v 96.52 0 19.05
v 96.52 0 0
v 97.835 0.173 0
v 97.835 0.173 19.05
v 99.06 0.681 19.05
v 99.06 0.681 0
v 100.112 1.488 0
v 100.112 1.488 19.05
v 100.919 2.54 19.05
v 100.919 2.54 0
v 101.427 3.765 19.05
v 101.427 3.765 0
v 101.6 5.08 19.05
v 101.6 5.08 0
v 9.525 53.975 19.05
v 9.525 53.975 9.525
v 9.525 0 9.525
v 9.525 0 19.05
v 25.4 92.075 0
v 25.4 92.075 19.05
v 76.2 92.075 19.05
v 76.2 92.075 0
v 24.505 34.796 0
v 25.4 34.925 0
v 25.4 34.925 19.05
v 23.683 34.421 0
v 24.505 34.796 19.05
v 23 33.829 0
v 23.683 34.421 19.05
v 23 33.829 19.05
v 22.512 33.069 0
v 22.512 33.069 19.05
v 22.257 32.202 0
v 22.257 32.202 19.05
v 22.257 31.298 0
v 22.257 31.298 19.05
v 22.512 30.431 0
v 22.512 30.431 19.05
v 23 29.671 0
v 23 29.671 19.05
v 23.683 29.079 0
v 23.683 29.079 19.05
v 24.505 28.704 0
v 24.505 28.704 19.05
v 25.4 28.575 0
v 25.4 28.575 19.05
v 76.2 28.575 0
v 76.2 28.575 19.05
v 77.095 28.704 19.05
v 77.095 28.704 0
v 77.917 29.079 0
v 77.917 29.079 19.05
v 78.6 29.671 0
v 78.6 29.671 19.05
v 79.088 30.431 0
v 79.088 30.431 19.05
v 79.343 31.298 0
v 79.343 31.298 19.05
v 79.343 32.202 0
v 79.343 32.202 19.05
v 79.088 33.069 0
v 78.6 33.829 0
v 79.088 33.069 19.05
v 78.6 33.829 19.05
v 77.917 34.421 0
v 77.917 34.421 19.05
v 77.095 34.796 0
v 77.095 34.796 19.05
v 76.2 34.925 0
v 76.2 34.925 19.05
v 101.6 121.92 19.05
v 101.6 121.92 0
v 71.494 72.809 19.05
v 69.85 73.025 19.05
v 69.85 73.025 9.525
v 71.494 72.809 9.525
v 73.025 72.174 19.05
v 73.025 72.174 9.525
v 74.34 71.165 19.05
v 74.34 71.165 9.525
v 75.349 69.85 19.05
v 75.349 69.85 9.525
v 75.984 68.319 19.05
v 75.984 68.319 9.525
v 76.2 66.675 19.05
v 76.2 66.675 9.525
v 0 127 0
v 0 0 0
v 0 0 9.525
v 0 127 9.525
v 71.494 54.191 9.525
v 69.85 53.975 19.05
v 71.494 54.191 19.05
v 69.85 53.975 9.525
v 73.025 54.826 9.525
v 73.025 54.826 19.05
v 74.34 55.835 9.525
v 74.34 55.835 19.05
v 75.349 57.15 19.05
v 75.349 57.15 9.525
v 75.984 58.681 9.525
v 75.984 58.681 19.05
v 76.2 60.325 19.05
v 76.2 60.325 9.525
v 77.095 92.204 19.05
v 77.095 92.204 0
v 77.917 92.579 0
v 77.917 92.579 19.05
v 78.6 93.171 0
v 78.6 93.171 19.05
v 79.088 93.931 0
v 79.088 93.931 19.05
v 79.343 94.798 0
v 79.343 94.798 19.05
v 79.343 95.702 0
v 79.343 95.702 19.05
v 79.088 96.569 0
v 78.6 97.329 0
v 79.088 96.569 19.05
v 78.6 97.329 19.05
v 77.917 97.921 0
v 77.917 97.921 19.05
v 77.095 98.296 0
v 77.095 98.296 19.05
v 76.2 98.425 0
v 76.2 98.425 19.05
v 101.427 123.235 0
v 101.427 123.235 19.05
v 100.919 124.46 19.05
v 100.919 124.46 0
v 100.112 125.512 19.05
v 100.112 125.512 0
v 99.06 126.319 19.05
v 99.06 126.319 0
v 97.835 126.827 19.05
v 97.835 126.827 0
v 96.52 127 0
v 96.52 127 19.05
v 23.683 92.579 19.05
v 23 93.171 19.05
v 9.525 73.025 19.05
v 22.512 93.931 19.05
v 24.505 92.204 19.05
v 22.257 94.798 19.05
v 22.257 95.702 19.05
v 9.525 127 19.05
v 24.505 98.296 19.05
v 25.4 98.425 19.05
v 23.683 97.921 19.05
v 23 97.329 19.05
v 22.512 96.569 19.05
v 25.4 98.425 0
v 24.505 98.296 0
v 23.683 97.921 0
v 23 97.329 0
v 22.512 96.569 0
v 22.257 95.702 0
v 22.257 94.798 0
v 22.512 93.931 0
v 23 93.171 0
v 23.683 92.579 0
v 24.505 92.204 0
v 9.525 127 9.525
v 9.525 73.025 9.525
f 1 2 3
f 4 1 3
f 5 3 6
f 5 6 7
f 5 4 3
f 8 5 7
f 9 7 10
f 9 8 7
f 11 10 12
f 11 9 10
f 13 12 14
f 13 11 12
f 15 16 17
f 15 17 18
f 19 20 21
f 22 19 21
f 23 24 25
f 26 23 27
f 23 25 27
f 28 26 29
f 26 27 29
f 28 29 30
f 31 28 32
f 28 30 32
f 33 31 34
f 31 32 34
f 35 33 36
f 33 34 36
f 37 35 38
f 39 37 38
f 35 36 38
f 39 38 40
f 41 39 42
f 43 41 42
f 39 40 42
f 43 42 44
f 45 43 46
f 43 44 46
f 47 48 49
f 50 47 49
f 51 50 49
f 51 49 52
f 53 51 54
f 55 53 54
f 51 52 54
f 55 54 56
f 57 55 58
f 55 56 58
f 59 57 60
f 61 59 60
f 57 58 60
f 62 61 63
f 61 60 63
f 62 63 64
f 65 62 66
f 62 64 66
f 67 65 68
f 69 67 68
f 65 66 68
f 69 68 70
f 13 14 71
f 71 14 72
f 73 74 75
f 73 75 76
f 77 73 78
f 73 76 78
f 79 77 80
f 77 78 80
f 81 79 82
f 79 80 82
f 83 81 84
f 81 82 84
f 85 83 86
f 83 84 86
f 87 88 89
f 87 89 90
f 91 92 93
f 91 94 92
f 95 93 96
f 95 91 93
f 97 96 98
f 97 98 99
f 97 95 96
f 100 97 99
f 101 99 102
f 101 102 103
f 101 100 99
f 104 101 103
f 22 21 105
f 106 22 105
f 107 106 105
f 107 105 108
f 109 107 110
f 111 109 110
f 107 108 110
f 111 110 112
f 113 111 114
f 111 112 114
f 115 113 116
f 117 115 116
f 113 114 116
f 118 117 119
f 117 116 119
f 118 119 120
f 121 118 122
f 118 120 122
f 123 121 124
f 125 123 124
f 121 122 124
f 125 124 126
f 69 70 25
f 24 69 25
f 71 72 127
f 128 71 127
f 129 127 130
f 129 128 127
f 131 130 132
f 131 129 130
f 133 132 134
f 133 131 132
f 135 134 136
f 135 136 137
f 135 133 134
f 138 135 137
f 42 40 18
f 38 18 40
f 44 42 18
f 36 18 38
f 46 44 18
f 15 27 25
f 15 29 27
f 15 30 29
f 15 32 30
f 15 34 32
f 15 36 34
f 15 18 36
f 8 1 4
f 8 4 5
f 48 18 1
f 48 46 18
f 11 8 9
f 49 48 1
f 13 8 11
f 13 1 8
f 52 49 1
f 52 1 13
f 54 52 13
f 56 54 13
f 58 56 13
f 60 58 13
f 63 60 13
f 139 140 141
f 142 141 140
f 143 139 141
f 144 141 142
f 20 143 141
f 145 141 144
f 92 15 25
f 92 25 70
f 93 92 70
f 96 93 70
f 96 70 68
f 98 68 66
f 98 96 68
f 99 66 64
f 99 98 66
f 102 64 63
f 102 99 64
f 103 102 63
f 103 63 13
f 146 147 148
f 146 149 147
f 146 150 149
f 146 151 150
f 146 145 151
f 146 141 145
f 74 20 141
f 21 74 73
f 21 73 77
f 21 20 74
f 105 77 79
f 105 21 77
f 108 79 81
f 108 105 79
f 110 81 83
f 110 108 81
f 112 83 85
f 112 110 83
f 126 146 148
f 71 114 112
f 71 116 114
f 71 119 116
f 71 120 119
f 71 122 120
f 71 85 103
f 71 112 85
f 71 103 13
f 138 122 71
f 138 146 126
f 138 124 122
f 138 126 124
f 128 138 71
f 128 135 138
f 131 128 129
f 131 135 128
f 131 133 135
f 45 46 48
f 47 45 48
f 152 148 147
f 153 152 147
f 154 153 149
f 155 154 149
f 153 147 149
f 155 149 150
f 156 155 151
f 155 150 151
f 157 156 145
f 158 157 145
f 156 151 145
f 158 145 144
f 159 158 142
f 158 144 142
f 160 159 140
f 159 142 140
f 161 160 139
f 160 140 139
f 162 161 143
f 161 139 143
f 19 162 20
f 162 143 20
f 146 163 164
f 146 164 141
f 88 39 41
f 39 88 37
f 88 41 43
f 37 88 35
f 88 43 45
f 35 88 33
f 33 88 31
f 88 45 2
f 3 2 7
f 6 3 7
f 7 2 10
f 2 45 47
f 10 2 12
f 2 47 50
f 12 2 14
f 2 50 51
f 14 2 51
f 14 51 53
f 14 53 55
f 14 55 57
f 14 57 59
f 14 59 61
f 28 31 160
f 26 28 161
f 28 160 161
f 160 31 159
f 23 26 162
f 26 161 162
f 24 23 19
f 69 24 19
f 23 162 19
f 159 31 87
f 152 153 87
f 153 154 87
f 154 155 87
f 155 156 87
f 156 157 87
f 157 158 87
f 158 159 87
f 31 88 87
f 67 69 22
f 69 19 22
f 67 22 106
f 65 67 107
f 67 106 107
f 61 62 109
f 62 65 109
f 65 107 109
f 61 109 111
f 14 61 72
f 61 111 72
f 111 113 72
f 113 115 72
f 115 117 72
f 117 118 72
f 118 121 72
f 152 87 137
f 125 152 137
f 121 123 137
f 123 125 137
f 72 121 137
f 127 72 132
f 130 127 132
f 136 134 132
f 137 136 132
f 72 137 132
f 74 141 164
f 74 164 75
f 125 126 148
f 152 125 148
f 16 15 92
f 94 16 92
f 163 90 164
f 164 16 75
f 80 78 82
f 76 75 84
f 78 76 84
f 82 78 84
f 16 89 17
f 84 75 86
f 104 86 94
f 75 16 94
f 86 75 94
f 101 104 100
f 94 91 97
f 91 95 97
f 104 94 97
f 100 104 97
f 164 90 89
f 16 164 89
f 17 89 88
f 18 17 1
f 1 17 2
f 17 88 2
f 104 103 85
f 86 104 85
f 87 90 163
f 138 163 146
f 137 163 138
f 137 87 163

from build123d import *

# Parameters (mm, degrees)
F0_W     = 101.6
F0_H     = 127
F1_DEPTH = 19.05
F2_W     = 76.2
F2_H     = 19.05
F3_DEPTH = 9.525
F4_R     = 6.35
F6_DEPTH = 19.051
F7_R     = 5.08
F8_W     = 25.4
F8_H     = 19.05
F9_DEPTH = 127.001


with BuildPart() as f1:
    # F0 (on Top) → F1 (new body)
    with BuildSketch(Plane.XY):
        with Locations((50.8, 63.5)):
            Rectangle(F0_W, F0_H)
    extrude(amount=F1_DEPTH)

    # F2 (on face) → F3 (cut)
    with BuildSketch(Plane.XY.offset(19.05)):
        with Locations((38.1, 63.5)):
            Rectangle(F2_W, F2_H)
    extrude(amount=-F3_DEPTH, mode=Mode.SUBTRACT)

    # F4
    f4_edges = [f1.edges().sort_by_distance(p)[0] for p in [
        (76.2, 73.025, 14.2875),
        (76.2, 53.975, 14.2875),
    ]]
    fillet(f4_edges, radius=F4_R)

    # F5 (on face) → F6 (cut, through all)
    with BuildSketch(Plane.XY.offset(19.05)):
        with BuildLine():
            ThreePointArc((25.4, 34.925), (22.225, 31.75), (25.4, 28.575))
            Line((25.4, 28.575), (76.2, 28.575))
            ThreePointArc((76.2, 28.575), (79.375, 31.75), (76.2, 34.925))
            Line((76.2, 34.925), (25.4, 34.925))
        make_face()
        with BuildLine():
            ThreePointArc((25.4, 98.425), (22.225, 95.25), (25.4, 92.075))
            Line((25.4, 92.075), (76.2, 92.075))
            ThreePointArc((76.2, 92.075), (79.375, 95.25), (76.2, 98.425))
            Line((76.2, 98.425), (25.4, 98.425))
        make_face()
    extrude(amount=-F6_DEPTH, mode=Mode.SUBTRACT)

    # F7
    f7_edges = [f1.edges().sort_by_distance(p)[0] for p in [
        (101.6, 0, 9.525),
        (101.6, 127, 9.525),
    ]]
    fillet(f7_edges, radius=F7_R)

    # F8 (on face) → F9 (cut, through all)
    with BuildSketch(Plane.XZ):
        with Locations((-3.175, 19.05)):
            Rectangle(F8_W, F8_H)
    extrude(amount=-F9_DEPTH, mode=Mode.SUBTRACT)


solid = f1.part
